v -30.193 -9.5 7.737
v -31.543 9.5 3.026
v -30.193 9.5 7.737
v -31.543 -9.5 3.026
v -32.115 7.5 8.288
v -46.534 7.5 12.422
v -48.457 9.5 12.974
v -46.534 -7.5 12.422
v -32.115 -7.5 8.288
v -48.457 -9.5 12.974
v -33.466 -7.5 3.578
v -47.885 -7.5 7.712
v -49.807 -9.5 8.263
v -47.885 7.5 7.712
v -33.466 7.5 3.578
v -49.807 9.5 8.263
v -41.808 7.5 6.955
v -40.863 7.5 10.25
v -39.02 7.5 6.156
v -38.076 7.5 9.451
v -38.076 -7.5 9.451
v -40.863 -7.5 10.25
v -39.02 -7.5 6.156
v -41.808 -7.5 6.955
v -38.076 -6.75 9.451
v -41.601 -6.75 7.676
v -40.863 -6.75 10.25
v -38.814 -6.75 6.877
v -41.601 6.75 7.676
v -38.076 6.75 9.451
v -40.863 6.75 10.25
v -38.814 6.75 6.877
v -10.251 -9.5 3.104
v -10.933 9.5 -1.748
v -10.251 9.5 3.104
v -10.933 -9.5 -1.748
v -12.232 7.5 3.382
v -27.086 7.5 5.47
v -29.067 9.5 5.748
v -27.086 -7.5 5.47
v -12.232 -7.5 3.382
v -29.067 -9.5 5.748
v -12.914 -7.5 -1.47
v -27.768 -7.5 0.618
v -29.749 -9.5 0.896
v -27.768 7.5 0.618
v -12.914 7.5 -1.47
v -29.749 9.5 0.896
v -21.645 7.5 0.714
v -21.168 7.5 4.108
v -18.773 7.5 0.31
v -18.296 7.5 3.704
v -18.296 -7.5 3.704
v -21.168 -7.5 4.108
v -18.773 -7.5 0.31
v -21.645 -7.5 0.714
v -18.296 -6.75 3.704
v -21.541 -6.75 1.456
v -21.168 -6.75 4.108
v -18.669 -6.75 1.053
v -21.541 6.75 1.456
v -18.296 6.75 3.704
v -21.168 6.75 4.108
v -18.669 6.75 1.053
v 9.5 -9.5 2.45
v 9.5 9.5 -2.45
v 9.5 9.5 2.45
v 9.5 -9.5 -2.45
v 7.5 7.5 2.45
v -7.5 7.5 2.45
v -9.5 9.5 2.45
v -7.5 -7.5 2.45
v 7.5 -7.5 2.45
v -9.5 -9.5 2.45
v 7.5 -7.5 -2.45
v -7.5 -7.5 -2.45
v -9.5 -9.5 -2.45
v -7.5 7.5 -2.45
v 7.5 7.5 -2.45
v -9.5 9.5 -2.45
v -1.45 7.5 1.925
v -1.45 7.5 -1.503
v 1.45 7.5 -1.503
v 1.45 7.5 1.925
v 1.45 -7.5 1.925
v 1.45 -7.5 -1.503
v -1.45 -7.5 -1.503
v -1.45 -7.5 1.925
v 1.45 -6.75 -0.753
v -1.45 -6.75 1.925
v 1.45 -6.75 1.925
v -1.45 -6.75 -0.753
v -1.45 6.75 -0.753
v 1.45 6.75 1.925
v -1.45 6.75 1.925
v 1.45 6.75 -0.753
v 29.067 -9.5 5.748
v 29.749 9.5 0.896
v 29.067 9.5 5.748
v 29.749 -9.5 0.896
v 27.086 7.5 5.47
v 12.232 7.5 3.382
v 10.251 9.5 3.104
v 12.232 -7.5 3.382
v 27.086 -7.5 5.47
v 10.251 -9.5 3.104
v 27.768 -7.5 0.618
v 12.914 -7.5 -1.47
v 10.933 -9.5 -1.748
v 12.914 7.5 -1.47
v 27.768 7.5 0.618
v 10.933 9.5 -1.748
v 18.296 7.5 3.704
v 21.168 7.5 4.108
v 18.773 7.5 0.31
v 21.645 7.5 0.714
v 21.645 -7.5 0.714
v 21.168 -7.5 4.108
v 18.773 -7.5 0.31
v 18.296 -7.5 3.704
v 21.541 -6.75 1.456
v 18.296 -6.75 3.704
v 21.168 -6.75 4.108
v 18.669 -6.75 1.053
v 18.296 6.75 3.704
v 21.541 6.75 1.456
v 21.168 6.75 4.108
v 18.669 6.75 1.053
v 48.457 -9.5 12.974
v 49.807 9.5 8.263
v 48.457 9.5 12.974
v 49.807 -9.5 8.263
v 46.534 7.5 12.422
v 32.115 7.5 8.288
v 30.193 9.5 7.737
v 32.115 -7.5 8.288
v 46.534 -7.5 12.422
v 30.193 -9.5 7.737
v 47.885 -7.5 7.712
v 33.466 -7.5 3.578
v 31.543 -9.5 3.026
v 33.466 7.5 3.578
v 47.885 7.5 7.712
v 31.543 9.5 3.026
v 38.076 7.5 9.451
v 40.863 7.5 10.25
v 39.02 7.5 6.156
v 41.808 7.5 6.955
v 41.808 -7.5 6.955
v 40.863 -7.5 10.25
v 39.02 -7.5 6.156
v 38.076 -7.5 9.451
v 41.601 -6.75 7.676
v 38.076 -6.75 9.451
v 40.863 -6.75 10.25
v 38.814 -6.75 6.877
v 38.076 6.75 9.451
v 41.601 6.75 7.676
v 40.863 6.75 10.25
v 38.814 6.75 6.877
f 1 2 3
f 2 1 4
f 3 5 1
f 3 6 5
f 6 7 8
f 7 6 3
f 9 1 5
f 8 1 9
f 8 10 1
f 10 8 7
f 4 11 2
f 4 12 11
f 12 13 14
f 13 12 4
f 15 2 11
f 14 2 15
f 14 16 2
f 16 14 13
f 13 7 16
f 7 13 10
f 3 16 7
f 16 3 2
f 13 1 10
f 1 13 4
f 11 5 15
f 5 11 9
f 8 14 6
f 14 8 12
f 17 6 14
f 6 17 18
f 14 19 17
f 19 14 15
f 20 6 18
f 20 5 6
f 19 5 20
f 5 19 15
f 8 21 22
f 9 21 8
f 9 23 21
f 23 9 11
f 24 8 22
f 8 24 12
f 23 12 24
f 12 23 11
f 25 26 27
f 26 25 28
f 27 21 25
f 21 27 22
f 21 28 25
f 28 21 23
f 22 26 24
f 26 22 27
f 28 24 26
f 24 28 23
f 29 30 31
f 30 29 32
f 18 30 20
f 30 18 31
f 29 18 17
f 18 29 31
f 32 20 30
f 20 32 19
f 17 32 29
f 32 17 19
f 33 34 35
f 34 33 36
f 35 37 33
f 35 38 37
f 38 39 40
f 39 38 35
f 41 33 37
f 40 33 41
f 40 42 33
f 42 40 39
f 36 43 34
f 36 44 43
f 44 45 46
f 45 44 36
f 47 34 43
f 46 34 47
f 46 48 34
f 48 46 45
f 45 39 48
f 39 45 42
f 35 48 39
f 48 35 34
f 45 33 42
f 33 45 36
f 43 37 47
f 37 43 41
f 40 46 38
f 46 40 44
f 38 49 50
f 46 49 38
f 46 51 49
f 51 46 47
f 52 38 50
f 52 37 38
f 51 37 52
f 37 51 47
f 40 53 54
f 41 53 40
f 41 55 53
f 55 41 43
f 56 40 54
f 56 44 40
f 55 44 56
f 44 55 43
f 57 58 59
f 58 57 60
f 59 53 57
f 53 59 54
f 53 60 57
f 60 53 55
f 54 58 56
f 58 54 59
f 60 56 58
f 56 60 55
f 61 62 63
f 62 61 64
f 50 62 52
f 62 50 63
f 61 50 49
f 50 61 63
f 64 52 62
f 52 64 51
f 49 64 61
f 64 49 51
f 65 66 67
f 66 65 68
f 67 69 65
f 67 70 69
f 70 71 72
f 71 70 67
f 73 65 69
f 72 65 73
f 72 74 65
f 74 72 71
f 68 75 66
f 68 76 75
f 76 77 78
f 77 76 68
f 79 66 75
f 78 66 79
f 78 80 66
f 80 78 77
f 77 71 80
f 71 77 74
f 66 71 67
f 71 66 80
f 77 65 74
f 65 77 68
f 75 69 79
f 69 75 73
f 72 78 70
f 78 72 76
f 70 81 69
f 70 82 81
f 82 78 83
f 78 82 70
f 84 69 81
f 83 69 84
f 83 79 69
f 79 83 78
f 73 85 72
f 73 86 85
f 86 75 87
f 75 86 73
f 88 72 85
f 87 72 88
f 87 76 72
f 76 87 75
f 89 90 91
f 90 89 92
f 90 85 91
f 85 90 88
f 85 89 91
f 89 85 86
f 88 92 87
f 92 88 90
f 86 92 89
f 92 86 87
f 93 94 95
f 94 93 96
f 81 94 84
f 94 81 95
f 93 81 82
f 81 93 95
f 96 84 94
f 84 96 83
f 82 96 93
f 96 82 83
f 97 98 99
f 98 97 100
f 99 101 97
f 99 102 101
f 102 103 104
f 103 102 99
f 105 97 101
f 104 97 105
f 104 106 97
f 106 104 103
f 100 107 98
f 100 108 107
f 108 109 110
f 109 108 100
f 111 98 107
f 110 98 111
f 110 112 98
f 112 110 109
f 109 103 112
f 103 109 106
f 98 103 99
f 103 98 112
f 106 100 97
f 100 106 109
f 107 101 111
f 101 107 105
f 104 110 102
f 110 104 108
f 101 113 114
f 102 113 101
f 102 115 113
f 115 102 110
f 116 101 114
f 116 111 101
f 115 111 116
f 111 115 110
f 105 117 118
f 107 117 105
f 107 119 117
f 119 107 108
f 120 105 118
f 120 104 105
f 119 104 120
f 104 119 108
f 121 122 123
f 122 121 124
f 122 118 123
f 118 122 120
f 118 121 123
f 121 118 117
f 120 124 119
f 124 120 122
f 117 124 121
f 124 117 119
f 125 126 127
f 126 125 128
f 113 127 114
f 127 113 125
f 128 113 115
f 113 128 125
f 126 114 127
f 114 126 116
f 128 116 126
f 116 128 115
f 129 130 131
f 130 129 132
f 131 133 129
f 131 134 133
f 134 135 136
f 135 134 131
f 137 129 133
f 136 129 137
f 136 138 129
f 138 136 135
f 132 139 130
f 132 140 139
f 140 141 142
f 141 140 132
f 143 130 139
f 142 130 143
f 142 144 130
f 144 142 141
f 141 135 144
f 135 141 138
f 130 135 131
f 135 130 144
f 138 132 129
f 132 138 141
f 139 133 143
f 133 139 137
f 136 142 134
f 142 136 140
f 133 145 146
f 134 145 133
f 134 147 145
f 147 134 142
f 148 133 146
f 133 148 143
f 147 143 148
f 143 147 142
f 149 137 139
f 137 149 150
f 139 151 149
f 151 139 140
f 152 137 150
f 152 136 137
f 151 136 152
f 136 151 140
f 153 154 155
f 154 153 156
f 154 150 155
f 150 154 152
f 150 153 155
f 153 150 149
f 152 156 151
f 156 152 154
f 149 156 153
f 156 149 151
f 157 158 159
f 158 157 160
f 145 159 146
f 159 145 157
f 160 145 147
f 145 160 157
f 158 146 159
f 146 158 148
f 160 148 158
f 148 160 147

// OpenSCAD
union () {
  union () {
    translate ([-40.0, 0, 8.0]) {
      rotate (a=16.0, v=[0, 1, 0]) {
        union () {
          difference () {
            cube ([19, 19, 4.9], center=true);
            cube ([15, 15, 10], center=true);
            translate ([0, 0, -3.9]) {
              cube ([15, 15, 4], center=true);
            }
          }
          translate ([0, -7.125, 0]) {
            rotate (a=90.0, v=[0, 0, 1]) {
              rotate (a=180.0, v=[0, 0, 1]) {
                rotate (a=180.0, v=[0, 1, 0]) {
                  difference () {
                    cube ([0.75, 2.9, 3.85], center=true);
                    translate ([0, 0, 3.85]) {
                      rotate (a=45.0, v=[0, 1, 0]) {
                        cube ([7.5, 2.9, 3.85], center=true);
                      }
                    }
                  }
                }
              }
            }
          }
          translate ([0, 7.125, 0]) {
            rotate (a=90.0, v=[0, 0, 1]) {
              rotate (a=180.0, v=[0, 1, 0]) {
                difference () {
                  cube ([0.75, 2.9, 3.85], center=true);
                  translate ([0, 0, 3.85]) {
                    rotate (a=45.0, v=[0, 1, 0]) {
                      cube ([7.5, 2.9, 3.85], center=true);
                    }
                  }
                }
              }
            }
          }
        }
      }
    }
  }
  union () {
    translate ([-20.0, 0, 2.0]) {
      rotate (a=8.0, v=[0, 1, 0]) {
        union () {
          difference () {
            cube ([19, 19, 4.9], center=true);
            cube ([15, 15, 10], center=true);
            translate ([0, 0, -3.9]) {
              cube ([15, 15, 4], center=true);
            }
          }
          translate ([0, -7.125, 0]) {
            rotate (a=90.0, v=[0, 0, 1]) {
              rotate (a=180.0, v=[0, 0, 1]) {
                rotate (a=180.0, v=[0, 1, 0]) {
                  difference () {
                    cube ([0.75, 2.9, 3.85], center=true);
                    translate ([0, 0, 3.85]) {
                      rotate (a=45.0, v=[0, 1, 0]) {
                        cube ([7.5, 2.9, 3.85], center=true);
                      }
                    }
                  }
                }
              }
            }
          }
          translate ([0, 7.125, 0]) {
            rotate (a=90.0, v=[0, 0, 1]) {
              rotate (a=180.0, v=[0, 1, 0]) {
                difference () {
                  cube ([0.75, 2.9, 3.85], center=true);
                  translate ([0, 0, 3.85]) {
                    rotate (a=45.0, v=[0, 1, 0]) {
                      cube ([7.5, 2.9, 3.85], center=true);
                    }
                  }
                }
              }
            }
          }
        }
      }
    }
  }
  union () {
    translate ([0.0, 0, 0.0]) {
      rotate (a=-0.0, v=[0, 1, 0]) {
        union () {
          difference () {
            cube ([19, 19, 4.9], center=true);
            cube ([15, 15, 10], center=true);
            translate ([0, 0, -3.9]) {
              cube ([15, 15, 4], center=true);
            }
          }
          translate ([0, -7.125, 0]) {
            rotate (a=90.0, v=[0, 0, 1]) {
              rotate (a=180.0, v=[0, 0, 1]) {
                rotate (a=180.0, v=[0, 1, 0]) {
                  difference () {
                    cube ([0.75, 2.9, 3.85], center=true);
                    translate ([0, 0, 3.85]) {
                      rotate (a=45.0, v=[0, 1, 0]) {
                        cube ([7.5, 2.9, 3.85], center=true);
                      }
                    }
                  }
                }
              }
            }
          }
          translate ([0, 7.125, 0]) {
            rotate (a=90.0, v=[0, 0, 1]) {
              rotate (a=180.0, v=[0, 1, 0]) {
                difference () {
                  cube ([0.75, 2.9, 3.85], center=true);
                  translate ([0, 0, 3.85]) {
                    rotate (a=45.0, v=[0, 1, 0]) {
                      cube ([7.5, 2.9, 3.85], center=true);
                    }
                  }
                }
              }
            }
          }
        }
      }
    }
  }
  union () {
    translate ([20.0, 0, 2.0]) {
      rotate (a=-8.0, v=[0, 1, 0]) {
        union () {
          difference () {
            cube ([19, 19, 4.9], center=true);
            cube ([15, 15, 10], center=true);
            translate ([0, 0, -3.9]) {
              cube ([15, 15, 4], center=true);
            }
          }
          translate ([0, -7.125, 0]) {
            rotate (a=90.0, v=[0, 0, 1]) {
              rotate (a=180.0, v=[0, 0, 1]) {
                rotate (a=180.0, v=[0, 1, 0]) {
                  difference () {
                    cube ([0.75, 2.9, 3.85], center=true);
                    translate ([0, 0, 3.85]) {
                      rotate (a=45.0, v=[0, 1, 0]) {
                        cube ([7.5, 2.9, 3.85], center=true);
                      }
                    }
                  }
                }
              }
            }
          }
          translate ([0, 7.125, 0]) {
            rotate (a=90.0, v=[0, 0, 1]) {
              rotate (a=180.0, v=[0, 1, 0]) {
                difference () {
                  cube ([0.75, 2.9, 3.85], center=true);
                  translate ([0, 0, 3.85]) {
                    rotate (a=45.0, v=[0, 1, 0]) {
                      cube ([7.5, 2.9, 3.85], center=true);
                    }
                  }
                }
              }
            }
          }
        }
      }
    }
  }
  union () {
    translate ([40.0, 0, 8.0]) {
      rotate (a=-16.0, v=[0, 1, 0]) {
        union () {
          difference () {
            cube ([19, 19, 4.9], center=true);
            cube ([15, 15, 10], center=true);
            translate ([0, 0, -3.9]) {
              cube ([15, 15, 4], center=true);
            }
          }
          translate ([0, -7.125, 0]) {
            rotate (a=90.0, v=[0, 0, 1]) {
              rotate (a=180.0, v=[0, 0, 1]) {
                rotate (a=180.0, v=[0, 1, 0]) {
                  difference () {
                    cube ([0.75, 2.9, 3.85], center=true);
                    translate ([0, 0, 3.85]) {
                      rotate (a=45.0, v=[0, 1, 0]) {
                        cube ([7.5, 2.9, 3.85], center=true);
                      }
                    }
                  }
                }
              }
            }
          }
          translate ([0, 7.125, 0]) {
            rotate (a=90.0, v=[0, 0, 1]) {
              rotate (a=180.0, v=[0, 1, 0]) {
                difference () {
                  cube ([0.75, 2.9, 3.85], center=true);
                  translate ([0, 0, 3.85]) {
                    rotate (a=45.0, v=[0, 1, 0]) {
                      cube ([7.5, 2.9, 3.85], center=true);
                    }
                  }
                }
              }
            }
          }
        }
      }
    }
  }
}
